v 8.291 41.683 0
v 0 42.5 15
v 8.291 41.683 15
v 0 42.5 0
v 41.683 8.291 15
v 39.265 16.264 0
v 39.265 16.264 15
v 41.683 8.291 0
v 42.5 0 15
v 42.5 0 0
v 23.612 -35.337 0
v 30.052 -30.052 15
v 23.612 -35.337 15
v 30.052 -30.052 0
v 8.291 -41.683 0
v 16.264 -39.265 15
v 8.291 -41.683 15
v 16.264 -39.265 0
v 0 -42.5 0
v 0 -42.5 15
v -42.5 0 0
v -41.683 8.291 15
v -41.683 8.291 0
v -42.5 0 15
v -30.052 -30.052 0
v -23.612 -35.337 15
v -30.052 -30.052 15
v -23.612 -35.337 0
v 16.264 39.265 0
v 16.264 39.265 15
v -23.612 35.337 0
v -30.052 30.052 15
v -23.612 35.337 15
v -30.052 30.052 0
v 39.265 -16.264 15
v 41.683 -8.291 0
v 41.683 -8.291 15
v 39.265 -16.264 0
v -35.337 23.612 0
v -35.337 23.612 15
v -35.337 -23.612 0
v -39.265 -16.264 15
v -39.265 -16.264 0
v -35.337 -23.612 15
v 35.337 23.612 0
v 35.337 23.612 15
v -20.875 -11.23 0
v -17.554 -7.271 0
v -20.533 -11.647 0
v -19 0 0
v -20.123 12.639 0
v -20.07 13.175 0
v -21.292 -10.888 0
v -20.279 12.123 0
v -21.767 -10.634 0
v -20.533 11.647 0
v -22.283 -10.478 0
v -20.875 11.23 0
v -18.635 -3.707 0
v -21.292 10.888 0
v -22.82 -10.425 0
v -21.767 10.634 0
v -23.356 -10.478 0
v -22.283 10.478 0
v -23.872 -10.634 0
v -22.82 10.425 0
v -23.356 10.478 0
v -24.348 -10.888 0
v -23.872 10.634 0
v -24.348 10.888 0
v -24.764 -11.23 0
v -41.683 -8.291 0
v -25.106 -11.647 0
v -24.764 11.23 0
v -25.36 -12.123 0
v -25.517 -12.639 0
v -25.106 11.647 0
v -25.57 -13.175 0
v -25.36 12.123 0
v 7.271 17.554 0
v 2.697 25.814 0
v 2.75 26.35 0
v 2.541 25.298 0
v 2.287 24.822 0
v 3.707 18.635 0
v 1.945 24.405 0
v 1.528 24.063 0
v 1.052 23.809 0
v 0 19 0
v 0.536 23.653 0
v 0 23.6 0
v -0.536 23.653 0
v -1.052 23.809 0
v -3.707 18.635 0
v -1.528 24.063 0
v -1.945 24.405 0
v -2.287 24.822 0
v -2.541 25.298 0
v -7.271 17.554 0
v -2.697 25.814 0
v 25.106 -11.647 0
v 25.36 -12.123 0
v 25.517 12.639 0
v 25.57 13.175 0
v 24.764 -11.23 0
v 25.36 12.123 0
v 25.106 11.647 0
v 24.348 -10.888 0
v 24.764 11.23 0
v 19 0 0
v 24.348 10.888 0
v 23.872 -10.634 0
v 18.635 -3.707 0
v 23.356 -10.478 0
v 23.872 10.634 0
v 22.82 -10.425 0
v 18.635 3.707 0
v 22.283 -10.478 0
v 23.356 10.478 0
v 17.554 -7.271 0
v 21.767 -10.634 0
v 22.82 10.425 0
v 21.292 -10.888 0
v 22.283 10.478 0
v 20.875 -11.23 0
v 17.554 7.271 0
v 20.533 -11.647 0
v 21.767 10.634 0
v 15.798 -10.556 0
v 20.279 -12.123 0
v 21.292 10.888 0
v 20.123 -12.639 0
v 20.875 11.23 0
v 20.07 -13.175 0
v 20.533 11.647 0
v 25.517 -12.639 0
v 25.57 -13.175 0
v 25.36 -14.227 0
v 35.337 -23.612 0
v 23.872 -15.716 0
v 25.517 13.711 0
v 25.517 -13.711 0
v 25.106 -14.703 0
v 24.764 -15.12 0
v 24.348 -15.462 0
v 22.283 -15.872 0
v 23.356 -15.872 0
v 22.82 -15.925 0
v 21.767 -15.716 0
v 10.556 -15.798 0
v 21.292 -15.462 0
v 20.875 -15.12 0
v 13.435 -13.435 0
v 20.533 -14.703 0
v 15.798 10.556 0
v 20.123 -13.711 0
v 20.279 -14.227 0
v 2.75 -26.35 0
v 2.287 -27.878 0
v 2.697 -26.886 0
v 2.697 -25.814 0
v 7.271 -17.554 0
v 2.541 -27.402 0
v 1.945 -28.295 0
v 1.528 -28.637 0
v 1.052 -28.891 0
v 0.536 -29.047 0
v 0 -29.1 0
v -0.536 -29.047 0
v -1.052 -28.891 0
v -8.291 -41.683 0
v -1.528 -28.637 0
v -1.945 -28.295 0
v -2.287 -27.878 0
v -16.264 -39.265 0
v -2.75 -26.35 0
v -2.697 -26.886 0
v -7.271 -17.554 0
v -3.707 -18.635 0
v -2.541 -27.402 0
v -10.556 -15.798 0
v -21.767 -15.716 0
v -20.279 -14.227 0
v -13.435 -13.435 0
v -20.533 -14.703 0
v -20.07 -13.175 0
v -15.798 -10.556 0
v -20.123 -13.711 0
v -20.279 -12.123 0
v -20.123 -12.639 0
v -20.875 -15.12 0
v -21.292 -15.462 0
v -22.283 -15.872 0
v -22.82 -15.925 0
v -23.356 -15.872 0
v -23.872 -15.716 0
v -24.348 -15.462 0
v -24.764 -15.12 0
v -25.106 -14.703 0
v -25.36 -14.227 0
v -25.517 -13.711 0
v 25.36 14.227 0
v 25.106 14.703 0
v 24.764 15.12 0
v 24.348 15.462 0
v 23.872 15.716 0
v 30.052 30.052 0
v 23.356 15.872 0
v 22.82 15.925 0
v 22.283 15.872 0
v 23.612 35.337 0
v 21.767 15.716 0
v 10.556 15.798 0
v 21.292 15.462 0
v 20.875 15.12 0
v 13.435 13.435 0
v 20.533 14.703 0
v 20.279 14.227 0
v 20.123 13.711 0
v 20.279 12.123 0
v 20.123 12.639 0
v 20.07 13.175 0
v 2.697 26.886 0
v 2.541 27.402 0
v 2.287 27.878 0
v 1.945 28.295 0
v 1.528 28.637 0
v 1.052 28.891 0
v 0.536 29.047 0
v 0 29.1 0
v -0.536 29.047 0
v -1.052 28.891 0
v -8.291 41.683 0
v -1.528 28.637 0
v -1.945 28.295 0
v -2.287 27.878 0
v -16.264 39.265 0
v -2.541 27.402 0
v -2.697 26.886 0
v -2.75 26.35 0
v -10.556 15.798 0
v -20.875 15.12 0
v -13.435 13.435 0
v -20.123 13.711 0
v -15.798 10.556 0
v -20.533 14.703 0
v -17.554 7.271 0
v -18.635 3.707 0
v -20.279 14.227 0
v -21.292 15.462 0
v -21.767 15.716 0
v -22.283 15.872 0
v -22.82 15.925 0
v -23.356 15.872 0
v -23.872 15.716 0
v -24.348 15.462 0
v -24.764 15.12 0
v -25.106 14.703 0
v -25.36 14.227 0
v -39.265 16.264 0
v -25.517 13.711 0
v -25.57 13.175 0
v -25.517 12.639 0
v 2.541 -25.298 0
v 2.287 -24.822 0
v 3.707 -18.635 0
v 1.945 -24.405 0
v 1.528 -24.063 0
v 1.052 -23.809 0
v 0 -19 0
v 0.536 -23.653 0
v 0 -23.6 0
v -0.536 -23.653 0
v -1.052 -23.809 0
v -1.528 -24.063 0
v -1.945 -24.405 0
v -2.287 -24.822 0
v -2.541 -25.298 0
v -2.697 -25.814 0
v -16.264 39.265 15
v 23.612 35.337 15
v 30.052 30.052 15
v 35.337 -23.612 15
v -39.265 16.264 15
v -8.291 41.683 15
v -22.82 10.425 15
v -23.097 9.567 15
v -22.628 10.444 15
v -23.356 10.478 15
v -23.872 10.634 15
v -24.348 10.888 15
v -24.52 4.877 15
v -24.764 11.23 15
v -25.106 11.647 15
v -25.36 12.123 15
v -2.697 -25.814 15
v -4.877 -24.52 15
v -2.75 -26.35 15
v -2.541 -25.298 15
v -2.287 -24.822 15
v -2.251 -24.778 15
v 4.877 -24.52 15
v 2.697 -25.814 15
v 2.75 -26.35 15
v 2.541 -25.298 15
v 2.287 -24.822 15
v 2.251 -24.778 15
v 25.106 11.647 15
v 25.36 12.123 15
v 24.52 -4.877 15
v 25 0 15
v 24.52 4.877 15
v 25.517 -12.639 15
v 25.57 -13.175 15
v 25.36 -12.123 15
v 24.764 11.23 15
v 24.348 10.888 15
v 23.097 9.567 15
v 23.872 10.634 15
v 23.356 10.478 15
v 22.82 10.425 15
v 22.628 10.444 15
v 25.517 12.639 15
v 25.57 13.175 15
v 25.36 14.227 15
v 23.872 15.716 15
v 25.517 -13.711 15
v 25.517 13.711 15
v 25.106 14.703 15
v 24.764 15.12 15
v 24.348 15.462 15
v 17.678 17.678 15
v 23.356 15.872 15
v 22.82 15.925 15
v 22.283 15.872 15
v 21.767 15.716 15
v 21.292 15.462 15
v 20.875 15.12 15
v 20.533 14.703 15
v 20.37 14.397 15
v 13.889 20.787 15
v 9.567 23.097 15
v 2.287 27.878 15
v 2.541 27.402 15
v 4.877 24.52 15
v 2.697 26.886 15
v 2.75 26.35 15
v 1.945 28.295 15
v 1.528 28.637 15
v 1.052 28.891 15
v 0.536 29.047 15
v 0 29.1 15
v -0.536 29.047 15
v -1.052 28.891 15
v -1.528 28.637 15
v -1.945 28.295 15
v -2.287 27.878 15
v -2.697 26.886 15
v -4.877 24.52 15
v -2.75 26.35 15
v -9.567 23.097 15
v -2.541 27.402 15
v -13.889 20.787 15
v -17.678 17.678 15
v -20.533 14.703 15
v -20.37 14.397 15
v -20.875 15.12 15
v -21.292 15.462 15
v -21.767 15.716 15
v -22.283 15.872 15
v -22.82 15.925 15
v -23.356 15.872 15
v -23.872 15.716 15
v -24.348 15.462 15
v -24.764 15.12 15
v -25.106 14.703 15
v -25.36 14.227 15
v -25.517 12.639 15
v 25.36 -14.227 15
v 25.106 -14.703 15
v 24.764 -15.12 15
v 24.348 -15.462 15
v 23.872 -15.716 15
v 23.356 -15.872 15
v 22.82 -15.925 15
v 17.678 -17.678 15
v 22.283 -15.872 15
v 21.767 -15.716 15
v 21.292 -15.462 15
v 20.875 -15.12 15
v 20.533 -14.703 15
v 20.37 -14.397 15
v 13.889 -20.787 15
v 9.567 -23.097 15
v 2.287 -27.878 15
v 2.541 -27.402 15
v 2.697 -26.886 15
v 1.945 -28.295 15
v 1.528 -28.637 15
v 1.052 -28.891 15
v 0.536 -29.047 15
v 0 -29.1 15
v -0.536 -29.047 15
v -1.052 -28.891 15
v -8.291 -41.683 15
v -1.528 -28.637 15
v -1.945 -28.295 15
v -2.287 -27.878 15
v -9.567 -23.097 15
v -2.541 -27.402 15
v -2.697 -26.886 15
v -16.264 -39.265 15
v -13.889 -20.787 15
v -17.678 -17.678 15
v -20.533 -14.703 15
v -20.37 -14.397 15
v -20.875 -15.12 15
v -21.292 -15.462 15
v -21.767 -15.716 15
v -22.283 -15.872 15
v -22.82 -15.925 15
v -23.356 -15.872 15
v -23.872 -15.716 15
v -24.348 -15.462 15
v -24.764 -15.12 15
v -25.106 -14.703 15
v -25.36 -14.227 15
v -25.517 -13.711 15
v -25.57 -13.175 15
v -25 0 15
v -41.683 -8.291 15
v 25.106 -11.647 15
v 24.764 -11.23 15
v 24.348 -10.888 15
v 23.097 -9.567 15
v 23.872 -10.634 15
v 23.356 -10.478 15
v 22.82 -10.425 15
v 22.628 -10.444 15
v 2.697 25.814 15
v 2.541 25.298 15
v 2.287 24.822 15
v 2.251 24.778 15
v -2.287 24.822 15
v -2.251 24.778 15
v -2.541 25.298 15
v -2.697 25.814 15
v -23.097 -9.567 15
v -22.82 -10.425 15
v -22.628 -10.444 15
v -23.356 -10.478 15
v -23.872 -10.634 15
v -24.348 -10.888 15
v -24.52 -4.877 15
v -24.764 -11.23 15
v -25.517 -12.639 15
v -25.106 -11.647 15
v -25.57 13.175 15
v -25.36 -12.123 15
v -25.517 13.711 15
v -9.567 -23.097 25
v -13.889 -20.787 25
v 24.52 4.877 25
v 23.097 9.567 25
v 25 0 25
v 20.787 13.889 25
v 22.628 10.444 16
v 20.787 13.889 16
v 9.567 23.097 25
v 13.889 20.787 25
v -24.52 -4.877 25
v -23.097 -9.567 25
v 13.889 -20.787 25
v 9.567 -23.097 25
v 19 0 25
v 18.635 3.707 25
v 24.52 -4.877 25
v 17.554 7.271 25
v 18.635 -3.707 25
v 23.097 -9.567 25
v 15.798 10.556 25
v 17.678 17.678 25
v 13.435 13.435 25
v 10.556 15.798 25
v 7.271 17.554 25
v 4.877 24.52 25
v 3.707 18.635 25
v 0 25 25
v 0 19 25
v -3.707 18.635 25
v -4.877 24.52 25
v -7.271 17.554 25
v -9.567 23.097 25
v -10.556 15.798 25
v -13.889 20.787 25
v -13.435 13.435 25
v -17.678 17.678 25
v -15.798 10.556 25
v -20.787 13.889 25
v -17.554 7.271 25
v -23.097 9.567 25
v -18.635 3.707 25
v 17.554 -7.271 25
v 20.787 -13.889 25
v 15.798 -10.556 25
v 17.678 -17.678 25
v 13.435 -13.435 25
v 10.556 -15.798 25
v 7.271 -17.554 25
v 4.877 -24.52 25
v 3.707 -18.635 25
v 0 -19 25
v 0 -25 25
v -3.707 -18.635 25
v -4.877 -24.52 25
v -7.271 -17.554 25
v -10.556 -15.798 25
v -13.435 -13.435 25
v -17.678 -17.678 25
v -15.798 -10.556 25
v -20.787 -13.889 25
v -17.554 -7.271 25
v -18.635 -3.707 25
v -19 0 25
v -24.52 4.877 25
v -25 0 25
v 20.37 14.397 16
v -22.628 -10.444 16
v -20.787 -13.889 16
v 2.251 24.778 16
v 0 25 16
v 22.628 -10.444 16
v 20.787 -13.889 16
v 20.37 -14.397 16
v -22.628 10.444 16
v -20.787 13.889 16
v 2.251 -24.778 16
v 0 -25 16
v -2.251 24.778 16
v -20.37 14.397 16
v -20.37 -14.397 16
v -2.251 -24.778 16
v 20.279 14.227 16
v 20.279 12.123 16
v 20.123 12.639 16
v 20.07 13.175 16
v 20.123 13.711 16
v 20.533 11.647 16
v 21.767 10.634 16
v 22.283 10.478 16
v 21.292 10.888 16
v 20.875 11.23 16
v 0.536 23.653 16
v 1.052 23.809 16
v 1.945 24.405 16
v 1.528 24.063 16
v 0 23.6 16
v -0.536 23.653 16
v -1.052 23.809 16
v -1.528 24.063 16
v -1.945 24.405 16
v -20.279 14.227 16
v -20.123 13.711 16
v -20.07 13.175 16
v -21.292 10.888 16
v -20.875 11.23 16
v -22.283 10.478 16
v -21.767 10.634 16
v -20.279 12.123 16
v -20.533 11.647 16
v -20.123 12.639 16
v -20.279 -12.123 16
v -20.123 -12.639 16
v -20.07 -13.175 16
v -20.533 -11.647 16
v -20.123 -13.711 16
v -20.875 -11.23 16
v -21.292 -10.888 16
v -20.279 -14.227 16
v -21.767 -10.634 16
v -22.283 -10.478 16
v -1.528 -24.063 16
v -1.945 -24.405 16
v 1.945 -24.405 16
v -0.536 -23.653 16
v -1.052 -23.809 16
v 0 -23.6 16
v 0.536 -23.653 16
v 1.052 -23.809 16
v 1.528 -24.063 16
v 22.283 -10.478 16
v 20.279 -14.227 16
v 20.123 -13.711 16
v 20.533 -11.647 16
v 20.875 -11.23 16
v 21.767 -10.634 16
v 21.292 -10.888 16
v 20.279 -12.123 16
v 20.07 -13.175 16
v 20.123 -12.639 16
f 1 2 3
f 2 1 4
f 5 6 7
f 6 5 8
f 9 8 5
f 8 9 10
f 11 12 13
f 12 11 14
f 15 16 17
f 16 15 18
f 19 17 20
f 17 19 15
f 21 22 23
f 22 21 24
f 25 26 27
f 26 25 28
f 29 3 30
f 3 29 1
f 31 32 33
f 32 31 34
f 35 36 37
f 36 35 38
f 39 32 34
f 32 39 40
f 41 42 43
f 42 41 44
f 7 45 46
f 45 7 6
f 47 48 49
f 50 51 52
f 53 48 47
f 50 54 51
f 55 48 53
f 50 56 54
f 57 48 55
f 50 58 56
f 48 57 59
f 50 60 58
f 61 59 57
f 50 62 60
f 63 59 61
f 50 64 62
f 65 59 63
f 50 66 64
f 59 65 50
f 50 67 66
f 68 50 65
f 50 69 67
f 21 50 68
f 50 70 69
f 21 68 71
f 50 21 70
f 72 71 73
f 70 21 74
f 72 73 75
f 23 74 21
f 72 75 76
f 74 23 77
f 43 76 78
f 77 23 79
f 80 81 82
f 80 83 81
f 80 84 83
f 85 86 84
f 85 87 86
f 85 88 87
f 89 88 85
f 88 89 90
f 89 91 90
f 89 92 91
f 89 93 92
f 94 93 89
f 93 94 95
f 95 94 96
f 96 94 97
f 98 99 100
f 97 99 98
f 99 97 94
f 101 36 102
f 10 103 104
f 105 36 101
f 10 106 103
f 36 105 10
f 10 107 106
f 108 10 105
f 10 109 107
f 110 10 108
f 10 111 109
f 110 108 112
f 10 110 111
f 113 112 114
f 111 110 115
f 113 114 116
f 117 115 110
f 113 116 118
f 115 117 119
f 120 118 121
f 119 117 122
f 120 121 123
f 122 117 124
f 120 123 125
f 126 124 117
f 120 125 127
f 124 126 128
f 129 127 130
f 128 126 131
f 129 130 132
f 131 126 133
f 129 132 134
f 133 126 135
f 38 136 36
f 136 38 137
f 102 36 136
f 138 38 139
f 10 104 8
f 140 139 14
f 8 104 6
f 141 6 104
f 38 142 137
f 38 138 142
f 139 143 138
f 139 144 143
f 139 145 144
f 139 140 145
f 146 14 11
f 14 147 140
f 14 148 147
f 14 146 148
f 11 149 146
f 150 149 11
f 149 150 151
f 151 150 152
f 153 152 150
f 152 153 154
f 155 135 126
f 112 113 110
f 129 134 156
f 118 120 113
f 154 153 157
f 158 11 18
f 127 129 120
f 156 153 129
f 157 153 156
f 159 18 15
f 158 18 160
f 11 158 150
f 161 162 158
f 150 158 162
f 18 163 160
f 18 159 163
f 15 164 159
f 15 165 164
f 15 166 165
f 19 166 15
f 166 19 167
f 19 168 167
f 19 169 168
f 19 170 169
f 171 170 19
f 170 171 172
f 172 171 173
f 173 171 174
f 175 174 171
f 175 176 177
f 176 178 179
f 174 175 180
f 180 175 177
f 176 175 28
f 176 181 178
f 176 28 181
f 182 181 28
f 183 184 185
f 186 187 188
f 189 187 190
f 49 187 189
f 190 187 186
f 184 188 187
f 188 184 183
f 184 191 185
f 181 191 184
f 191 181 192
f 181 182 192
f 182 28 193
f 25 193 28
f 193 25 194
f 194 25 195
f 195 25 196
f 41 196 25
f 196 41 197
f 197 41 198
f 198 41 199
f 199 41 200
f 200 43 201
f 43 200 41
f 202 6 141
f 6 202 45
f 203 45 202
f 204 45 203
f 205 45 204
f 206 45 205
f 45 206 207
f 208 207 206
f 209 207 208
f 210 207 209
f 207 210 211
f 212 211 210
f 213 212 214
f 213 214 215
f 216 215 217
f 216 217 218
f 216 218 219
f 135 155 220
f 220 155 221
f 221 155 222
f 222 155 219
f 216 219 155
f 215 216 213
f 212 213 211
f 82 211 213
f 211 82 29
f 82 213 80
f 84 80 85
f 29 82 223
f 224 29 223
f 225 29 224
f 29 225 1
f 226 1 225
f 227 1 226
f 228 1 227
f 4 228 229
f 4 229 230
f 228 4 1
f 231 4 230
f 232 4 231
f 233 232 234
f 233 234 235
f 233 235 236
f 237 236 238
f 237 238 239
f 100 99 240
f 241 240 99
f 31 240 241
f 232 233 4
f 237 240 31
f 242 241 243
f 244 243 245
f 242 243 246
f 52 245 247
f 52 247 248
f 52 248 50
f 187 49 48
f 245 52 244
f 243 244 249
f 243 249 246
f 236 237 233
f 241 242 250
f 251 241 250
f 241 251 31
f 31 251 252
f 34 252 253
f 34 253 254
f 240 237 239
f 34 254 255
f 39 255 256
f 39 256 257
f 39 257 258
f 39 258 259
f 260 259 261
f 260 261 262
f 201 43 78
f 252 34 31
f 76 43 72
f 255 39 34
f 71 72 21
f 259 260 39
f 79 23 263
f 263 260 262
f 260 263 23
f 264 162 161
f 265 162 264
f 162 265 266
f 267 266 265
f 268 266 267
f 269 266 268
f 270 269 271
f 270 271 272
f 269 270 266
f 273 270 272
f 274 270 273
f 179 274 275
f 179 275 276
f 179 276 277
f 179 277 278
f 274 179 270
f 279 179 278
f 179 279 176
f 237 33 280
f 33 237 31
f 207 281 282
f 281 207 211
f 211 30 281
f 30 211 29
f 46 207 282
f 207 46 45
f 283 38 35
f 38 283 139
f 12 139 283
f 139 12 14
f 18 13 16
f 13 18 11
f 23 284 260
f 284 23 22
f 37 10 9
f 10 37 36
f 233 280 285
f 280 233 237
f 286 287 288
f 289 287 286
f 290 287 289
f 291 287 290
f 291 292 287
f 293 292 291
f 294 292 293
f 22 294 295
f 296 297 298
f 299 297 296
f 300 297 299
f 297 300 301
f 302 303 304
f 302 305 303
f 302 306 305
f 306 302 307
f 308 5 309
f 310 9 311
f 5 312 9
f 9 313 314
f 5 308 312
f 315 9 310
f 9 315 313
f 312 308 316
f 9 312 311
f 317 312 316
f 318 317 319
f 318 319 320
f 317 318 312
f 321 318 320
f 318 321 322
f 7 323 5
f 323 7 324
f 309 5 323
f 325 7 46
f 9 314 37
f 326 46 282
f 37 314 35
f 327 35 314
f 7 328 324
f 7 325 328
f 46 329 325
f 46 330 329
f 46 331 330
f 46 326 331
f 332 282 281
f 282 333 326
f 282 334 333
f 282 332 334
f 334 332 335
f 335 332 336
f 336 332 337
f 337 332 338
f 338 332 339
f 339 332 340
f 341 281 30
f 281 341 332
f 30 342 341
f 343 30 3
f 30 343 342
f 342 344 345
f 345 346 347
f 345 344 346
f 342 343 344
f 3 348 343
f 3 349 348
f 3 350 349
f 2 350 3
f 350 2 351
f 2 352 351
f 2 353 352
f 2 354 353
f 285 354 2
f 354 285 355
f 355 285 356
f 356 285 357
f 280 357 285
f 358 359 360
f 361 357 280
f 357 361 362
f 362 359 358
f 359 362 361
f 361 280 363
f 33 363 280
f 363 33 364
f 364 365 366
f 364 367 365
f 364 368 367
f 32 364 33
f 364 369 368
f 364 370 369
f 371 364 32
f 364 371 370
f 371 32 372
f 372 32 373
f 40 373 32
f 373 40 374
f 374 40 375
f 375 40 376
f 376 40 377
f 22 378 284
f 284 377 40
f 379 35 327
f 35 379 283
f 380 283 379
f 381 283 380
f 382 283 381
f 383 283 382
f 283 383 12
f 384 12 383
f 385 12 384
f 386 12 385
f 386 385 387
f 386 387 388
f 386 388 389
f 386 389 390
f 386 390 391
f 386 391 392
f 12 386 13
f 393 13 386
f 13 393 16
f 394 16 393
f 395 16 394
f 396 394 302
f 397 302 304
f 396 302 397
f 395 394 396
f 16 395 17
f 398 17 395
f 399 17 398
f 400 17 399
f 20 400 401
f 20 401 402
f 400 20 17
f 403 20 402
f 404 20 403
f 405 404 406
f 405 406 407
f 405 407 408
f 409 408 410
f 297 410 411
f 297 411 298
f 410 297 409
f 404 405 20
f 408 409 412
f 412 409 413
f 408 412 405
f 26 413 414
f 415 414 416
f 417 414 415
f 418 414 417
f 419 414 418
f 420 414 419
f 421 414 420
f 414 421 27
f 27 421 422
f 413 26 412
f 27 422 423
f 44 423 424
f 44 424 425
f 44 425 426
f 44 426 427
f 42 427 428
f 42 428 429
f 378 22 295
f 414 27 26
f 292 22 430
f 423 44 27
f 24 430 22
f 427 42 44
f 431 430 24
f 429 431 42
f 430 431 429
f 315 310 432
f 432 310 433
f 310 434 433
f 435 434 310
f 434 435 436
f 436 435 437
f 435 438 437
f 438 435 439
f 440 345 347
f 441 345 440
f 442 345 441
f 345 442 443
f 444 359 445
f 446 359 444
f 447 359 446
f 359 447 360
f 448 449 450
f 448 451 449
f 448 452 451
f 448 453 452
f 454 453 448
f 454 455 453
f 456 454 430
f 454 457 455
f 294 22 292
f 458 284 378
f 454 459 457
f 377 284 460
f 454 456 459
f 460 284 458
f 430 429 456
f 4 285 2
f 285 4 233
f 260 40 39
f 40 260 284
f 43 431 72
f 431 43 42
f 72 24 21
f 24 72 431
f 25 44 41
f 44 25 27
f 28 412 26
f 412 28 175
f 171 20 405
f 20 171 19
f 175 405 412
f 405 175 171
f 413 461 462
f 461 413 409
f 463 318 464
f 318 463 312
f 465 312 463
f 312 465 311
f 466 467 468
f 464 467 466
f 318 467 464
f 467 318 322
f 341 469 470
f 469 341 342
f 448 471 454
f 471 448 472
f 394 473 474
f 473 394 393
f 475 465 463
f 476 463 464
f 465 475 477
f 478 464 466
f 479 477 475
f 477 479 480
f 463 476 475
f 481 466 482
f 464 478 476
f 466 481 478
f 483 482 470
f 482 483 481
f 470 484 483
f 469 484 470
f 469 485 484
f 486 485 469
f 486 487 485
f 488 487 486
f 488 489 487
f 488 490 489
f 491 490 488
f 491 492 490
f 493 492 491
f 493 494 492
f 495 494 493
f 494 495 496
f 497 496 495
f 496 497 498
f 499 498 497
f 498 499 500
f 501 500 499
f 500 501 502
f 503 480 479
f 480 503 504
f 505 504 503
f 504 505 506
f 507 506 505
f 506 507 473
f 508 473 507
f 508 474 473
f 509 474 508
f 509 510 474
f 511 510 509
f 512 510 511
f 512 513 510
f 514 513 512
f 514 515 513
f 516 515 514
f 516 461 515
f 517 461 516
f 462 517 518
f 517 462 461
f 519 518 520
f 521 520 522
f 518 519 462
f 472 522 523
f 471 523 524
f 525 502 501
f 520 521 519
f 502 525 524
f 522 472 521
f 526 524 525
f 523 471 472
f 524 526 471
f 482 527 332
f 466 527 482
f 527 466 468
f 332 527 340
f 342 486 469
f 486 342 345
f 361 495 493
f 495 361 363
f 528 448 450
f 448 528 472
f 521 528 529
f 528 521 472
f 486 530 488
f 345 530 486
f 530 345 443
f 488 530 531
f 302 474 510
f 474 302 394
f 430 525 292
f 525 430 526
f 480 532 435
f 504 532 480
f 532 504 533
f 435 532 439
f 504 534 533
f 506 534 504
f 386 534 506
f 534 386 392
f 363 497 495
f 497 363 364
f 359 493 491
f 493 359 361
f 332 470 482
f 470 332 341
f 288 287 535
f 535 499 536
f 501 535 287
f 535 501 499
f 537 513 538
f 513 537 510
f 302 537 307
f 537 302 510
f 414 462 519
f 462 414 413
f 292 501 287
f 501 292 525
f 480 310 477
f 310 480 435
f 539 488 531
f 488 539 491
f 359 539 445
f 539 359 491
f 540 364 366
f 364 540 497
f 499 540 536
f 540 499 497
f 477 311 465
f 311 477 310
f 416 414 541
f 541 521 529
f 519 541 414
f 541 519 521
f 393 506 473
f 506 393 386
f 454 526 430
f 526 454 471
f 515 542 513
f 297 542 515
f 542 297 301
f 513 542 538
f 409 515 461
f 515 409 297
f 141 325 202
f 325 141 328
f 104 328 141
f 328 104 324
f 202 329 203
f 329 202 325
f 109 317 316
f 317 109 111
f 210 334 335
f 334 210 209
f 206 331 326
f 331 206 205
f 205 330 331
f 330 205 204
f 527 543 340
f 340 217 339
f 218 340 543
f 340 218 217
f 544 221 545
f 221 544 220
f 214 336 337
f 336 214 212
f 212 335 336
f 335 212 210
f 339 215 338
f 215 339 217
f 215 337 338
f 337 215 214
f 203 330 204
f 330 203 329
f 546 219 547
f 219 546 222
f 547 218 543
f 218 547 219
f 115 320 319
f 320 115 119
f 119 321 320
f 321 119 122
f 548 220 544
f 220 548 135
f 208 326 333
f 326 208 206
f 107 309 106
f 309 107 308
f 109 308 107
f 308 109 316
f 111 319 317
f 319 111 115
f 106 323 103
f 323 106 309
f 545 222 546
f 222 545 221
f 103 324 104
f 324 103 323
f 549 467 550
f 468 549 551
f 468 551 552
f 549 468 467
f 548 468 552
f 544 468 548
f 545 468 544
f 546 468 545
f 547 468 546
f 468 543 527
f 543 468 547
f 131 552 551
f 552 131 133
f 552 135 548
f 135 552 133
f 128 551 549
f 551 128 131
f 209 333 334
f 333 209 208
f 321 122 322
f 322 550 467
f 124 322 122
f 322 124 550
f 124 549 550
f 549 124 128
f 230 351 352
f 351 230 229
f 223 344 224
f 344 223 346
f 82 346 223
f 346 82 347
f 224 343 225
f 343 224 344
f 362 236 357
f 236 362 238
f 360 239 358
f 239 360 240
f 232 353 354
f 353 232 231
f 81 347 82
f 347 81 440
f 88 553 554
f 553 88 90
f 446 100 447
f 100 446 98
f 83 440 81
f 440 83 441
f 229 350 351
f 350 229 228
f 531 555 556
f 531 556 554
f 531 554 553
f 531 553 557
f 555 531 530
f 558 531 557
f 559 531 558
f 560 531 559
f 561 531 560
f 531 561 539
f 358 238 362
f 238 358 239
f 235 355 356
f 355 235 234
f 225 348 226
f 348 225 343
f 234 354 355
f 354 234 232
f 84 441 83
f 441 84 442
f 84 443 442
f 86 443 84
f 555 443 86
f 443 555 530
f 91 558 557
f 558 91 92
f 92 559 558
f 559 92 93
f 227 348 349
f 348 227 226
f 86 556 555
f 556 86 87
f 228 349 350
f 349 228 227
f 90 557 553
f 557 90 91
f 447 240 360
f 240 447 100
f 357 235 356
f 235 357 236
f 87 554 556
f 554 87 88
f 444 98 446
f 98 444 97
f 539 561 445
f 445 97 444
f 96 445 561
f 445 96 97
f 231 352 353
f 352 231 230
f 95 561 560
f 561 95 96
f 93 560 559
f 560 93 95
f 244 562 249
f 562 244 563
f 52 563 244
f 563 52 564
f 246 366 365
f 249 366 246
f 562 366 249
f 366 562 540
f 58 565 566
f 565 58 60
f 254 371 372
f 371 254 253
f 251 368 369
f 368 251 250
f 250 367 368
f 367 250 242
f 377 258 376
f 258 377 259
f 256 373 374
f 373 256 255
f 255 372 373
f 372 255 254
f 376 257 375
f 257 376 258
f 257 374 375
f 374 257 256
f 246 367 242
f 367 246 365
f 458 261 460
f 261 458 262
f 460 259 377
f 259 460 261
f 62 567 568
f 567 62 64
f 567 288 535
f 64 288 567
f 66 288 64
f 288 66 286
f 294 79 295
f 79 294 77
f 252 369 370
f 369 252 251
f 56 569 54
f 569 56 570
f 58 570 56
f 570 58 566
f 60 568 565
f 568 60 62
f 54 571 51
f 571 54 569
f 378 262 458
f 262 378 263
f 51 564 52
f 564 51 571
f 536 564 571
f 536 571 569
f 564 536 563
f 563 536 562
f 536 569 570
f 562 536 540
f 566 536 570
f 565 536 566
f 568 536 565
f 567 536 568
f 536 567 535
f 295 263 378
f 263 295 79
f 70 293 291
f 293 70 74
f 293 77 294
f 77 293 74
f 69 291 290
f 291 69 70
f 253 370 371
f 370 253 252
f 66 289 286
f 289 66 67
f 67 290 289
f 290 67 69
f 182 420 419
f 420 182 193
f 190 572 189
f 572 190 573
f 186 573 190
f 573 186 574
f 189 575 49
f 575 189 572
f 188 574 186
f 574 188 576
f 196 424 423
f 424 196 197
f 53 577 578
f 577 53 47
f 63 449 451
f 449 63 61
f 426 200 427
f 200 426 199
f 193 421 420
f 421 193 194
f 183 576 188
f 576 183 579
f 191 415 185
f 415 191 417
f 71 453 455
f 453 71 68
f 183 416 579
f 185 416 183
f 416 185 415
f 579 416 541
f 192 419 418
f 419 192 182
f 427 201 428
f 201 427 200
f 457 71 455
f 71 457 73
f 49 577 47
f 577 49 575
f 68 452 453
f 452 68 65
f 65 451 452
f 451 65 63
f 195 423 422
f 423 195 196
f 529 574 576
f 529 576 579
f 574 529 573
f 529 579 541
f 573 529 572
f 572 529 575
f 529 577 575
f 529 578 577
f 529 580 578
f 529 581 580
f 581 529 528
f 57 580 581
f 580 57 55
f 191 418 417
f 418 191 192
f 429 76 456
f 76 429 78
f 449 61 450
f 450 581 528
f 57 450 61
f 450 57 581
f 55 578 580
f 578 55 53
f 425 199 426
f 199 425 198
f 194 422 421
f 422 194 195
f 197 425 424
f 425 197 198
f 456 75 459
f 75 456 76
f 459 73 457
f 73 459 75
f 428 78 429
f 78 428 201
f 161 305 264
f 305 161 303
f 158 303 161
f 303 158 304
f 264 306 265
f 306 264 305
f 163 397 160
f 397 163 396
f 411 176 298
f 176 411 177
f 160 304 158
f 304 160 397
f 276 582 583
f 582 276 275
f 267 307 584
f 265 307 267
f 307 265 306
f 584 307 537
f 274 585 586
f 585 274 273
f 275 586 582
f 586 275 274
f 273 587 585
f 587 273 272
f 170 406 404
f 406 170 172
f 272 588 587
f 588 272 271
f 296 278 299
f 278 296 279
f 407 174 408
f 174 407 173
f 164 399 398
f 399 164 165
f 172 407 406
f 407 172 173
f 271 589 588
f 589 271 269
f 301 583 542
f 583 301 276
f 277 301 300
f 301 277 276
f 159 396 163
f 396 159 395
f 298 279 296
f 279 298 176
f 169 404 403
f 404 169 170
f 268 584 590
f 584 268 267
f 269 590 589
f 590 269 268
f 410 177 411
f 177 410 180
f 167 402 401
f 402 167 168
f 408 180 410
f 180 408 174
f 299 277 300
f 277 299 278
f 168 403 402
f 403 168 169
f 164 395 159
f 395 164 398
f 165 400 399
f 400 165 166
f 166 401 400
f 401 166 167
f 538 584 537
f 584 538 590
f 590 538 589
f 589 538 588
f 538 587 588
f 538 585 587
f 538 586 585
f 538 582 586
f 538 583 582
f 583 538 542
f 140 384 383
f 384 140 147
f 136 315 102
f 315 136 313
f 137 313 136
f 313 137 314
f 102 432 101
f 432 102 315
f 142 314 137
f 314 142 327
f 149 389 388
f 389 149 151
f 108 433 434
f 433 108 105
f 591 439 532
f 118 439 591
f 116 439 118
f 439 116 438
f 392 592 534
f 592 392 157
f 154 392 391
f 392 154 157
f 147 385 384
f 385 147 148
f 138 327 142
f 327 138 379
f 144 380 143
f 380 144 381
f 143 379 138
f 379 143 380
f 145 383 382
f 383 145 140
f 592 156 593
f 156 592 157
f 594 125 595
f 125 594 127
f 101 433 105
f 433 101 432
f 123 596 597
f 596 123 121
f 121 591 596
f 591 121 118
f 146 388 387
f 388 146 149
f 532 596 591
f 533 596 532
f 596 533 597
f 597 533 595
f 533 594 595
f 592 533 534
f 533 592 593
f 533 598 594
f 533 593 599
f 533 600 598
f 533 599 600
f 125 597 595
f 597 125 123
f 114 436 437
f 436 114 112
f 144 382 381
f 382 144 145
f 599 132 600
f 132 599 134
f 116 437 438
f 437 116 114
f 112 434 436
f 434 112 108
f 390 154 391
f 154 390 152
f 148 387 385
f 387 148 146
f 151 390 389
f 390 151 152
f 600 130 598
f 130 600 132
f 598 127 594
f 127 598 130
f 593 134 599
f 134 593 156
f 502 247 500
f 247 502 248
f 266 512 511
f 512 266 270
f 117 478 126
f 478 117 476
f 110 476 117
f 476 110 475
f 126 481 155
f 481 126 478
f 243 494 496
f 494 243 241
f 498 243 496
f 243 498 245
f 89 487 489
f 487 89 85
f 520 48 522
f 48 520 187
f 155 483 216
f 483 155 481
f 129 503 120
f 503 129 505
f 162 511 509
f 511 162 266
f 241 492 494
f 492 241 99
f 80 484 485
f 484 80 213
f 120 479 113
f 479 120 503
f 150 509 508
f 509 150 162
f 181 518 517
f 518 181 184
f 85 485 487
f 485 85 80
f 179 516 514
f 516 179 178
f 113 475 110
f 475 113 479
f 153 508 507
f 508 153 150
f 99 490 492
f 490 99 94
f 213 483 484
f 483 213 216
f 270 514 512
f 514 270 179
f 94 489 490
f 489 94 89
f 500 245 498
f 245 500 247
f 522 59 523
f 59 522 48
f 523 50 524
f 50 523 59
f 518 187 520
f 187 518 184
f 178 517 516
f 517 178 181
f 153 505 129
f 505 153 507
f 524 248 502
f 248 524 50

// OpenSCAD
$fn = 32;

// ----------------------------------------------------------------------
// Flange Ø85 x 15
// 6 holes on a Ø52.7 bolt circle, bolted joints
// ----------------------------------------------------------------------

// --- parameters (mm) ---
flange_d = 85;   // outside diameter of the flange
thickness = 15;  // flange thickness
holes = 6;       // number of bolt holes
pcd = 52.7;      // bolt circle diameter
start_deg = 30;  // angle of the first hole, from +X
hole_d = 5.5;    // bolt hole diameter
bore_d = 38;     // central through bore
hub_d = 50;      // hub outside diameter
hub_h = 10;      // hub height above the flange face (0 = no hub)

// --- derived feature positions (mm) ---
height = thickness + hub_h;  // = 25   overall height of the part
pcd_r = pcd / 2;             // = 26.35   bolt circle radius
hole_step = 360 / holes;     // = 60   angular pitch
feature_centers = [
  [pcd_r * cos(start_deg + 0 * hole_step), pcd_r * sin(start_deg + 0 * hole_step)],
  [pcd_r * cos(start_deg + 1 * hole_step), pcd_r * sin(start_deg + 1 * hole_step)],
  [pcd_r * cos(start_deg + 2 * hole_step), pcd_r * sin(start_deg + 2 * hole_step)],
  [pcd_r * cos(start_deg + 3 * hole_step), pcd_r * sin(start_deg + 3 * hole_step)],
  [pcd_r * cos(start_deg + 4 * hole_step), pcd_r * sin(start_deg + 4 * hole_step)],
  [pcd_r * cos(start_deg + 5 * hole_step), pcd_r * sin(start_deg + 5 * hole_step)]
];   // bolt hole centres on the pitch circle

// flange disc, every hole and the bore cut straight through
difference() {
  union() {
    cylinder(d = flange_d, h = thickness);
    cylinder(d = hub_d, h = height);  // hub, overlapped into the flange
  }
  translate([0, 0, -1]) cylinder(d = bore_d, h = height + 2);  // bore, through
  for (centre = feature_centers)
    translate([centre[0], centre[1], -1]) cylinder(d = hole_d, h = thickness + 2);
}
